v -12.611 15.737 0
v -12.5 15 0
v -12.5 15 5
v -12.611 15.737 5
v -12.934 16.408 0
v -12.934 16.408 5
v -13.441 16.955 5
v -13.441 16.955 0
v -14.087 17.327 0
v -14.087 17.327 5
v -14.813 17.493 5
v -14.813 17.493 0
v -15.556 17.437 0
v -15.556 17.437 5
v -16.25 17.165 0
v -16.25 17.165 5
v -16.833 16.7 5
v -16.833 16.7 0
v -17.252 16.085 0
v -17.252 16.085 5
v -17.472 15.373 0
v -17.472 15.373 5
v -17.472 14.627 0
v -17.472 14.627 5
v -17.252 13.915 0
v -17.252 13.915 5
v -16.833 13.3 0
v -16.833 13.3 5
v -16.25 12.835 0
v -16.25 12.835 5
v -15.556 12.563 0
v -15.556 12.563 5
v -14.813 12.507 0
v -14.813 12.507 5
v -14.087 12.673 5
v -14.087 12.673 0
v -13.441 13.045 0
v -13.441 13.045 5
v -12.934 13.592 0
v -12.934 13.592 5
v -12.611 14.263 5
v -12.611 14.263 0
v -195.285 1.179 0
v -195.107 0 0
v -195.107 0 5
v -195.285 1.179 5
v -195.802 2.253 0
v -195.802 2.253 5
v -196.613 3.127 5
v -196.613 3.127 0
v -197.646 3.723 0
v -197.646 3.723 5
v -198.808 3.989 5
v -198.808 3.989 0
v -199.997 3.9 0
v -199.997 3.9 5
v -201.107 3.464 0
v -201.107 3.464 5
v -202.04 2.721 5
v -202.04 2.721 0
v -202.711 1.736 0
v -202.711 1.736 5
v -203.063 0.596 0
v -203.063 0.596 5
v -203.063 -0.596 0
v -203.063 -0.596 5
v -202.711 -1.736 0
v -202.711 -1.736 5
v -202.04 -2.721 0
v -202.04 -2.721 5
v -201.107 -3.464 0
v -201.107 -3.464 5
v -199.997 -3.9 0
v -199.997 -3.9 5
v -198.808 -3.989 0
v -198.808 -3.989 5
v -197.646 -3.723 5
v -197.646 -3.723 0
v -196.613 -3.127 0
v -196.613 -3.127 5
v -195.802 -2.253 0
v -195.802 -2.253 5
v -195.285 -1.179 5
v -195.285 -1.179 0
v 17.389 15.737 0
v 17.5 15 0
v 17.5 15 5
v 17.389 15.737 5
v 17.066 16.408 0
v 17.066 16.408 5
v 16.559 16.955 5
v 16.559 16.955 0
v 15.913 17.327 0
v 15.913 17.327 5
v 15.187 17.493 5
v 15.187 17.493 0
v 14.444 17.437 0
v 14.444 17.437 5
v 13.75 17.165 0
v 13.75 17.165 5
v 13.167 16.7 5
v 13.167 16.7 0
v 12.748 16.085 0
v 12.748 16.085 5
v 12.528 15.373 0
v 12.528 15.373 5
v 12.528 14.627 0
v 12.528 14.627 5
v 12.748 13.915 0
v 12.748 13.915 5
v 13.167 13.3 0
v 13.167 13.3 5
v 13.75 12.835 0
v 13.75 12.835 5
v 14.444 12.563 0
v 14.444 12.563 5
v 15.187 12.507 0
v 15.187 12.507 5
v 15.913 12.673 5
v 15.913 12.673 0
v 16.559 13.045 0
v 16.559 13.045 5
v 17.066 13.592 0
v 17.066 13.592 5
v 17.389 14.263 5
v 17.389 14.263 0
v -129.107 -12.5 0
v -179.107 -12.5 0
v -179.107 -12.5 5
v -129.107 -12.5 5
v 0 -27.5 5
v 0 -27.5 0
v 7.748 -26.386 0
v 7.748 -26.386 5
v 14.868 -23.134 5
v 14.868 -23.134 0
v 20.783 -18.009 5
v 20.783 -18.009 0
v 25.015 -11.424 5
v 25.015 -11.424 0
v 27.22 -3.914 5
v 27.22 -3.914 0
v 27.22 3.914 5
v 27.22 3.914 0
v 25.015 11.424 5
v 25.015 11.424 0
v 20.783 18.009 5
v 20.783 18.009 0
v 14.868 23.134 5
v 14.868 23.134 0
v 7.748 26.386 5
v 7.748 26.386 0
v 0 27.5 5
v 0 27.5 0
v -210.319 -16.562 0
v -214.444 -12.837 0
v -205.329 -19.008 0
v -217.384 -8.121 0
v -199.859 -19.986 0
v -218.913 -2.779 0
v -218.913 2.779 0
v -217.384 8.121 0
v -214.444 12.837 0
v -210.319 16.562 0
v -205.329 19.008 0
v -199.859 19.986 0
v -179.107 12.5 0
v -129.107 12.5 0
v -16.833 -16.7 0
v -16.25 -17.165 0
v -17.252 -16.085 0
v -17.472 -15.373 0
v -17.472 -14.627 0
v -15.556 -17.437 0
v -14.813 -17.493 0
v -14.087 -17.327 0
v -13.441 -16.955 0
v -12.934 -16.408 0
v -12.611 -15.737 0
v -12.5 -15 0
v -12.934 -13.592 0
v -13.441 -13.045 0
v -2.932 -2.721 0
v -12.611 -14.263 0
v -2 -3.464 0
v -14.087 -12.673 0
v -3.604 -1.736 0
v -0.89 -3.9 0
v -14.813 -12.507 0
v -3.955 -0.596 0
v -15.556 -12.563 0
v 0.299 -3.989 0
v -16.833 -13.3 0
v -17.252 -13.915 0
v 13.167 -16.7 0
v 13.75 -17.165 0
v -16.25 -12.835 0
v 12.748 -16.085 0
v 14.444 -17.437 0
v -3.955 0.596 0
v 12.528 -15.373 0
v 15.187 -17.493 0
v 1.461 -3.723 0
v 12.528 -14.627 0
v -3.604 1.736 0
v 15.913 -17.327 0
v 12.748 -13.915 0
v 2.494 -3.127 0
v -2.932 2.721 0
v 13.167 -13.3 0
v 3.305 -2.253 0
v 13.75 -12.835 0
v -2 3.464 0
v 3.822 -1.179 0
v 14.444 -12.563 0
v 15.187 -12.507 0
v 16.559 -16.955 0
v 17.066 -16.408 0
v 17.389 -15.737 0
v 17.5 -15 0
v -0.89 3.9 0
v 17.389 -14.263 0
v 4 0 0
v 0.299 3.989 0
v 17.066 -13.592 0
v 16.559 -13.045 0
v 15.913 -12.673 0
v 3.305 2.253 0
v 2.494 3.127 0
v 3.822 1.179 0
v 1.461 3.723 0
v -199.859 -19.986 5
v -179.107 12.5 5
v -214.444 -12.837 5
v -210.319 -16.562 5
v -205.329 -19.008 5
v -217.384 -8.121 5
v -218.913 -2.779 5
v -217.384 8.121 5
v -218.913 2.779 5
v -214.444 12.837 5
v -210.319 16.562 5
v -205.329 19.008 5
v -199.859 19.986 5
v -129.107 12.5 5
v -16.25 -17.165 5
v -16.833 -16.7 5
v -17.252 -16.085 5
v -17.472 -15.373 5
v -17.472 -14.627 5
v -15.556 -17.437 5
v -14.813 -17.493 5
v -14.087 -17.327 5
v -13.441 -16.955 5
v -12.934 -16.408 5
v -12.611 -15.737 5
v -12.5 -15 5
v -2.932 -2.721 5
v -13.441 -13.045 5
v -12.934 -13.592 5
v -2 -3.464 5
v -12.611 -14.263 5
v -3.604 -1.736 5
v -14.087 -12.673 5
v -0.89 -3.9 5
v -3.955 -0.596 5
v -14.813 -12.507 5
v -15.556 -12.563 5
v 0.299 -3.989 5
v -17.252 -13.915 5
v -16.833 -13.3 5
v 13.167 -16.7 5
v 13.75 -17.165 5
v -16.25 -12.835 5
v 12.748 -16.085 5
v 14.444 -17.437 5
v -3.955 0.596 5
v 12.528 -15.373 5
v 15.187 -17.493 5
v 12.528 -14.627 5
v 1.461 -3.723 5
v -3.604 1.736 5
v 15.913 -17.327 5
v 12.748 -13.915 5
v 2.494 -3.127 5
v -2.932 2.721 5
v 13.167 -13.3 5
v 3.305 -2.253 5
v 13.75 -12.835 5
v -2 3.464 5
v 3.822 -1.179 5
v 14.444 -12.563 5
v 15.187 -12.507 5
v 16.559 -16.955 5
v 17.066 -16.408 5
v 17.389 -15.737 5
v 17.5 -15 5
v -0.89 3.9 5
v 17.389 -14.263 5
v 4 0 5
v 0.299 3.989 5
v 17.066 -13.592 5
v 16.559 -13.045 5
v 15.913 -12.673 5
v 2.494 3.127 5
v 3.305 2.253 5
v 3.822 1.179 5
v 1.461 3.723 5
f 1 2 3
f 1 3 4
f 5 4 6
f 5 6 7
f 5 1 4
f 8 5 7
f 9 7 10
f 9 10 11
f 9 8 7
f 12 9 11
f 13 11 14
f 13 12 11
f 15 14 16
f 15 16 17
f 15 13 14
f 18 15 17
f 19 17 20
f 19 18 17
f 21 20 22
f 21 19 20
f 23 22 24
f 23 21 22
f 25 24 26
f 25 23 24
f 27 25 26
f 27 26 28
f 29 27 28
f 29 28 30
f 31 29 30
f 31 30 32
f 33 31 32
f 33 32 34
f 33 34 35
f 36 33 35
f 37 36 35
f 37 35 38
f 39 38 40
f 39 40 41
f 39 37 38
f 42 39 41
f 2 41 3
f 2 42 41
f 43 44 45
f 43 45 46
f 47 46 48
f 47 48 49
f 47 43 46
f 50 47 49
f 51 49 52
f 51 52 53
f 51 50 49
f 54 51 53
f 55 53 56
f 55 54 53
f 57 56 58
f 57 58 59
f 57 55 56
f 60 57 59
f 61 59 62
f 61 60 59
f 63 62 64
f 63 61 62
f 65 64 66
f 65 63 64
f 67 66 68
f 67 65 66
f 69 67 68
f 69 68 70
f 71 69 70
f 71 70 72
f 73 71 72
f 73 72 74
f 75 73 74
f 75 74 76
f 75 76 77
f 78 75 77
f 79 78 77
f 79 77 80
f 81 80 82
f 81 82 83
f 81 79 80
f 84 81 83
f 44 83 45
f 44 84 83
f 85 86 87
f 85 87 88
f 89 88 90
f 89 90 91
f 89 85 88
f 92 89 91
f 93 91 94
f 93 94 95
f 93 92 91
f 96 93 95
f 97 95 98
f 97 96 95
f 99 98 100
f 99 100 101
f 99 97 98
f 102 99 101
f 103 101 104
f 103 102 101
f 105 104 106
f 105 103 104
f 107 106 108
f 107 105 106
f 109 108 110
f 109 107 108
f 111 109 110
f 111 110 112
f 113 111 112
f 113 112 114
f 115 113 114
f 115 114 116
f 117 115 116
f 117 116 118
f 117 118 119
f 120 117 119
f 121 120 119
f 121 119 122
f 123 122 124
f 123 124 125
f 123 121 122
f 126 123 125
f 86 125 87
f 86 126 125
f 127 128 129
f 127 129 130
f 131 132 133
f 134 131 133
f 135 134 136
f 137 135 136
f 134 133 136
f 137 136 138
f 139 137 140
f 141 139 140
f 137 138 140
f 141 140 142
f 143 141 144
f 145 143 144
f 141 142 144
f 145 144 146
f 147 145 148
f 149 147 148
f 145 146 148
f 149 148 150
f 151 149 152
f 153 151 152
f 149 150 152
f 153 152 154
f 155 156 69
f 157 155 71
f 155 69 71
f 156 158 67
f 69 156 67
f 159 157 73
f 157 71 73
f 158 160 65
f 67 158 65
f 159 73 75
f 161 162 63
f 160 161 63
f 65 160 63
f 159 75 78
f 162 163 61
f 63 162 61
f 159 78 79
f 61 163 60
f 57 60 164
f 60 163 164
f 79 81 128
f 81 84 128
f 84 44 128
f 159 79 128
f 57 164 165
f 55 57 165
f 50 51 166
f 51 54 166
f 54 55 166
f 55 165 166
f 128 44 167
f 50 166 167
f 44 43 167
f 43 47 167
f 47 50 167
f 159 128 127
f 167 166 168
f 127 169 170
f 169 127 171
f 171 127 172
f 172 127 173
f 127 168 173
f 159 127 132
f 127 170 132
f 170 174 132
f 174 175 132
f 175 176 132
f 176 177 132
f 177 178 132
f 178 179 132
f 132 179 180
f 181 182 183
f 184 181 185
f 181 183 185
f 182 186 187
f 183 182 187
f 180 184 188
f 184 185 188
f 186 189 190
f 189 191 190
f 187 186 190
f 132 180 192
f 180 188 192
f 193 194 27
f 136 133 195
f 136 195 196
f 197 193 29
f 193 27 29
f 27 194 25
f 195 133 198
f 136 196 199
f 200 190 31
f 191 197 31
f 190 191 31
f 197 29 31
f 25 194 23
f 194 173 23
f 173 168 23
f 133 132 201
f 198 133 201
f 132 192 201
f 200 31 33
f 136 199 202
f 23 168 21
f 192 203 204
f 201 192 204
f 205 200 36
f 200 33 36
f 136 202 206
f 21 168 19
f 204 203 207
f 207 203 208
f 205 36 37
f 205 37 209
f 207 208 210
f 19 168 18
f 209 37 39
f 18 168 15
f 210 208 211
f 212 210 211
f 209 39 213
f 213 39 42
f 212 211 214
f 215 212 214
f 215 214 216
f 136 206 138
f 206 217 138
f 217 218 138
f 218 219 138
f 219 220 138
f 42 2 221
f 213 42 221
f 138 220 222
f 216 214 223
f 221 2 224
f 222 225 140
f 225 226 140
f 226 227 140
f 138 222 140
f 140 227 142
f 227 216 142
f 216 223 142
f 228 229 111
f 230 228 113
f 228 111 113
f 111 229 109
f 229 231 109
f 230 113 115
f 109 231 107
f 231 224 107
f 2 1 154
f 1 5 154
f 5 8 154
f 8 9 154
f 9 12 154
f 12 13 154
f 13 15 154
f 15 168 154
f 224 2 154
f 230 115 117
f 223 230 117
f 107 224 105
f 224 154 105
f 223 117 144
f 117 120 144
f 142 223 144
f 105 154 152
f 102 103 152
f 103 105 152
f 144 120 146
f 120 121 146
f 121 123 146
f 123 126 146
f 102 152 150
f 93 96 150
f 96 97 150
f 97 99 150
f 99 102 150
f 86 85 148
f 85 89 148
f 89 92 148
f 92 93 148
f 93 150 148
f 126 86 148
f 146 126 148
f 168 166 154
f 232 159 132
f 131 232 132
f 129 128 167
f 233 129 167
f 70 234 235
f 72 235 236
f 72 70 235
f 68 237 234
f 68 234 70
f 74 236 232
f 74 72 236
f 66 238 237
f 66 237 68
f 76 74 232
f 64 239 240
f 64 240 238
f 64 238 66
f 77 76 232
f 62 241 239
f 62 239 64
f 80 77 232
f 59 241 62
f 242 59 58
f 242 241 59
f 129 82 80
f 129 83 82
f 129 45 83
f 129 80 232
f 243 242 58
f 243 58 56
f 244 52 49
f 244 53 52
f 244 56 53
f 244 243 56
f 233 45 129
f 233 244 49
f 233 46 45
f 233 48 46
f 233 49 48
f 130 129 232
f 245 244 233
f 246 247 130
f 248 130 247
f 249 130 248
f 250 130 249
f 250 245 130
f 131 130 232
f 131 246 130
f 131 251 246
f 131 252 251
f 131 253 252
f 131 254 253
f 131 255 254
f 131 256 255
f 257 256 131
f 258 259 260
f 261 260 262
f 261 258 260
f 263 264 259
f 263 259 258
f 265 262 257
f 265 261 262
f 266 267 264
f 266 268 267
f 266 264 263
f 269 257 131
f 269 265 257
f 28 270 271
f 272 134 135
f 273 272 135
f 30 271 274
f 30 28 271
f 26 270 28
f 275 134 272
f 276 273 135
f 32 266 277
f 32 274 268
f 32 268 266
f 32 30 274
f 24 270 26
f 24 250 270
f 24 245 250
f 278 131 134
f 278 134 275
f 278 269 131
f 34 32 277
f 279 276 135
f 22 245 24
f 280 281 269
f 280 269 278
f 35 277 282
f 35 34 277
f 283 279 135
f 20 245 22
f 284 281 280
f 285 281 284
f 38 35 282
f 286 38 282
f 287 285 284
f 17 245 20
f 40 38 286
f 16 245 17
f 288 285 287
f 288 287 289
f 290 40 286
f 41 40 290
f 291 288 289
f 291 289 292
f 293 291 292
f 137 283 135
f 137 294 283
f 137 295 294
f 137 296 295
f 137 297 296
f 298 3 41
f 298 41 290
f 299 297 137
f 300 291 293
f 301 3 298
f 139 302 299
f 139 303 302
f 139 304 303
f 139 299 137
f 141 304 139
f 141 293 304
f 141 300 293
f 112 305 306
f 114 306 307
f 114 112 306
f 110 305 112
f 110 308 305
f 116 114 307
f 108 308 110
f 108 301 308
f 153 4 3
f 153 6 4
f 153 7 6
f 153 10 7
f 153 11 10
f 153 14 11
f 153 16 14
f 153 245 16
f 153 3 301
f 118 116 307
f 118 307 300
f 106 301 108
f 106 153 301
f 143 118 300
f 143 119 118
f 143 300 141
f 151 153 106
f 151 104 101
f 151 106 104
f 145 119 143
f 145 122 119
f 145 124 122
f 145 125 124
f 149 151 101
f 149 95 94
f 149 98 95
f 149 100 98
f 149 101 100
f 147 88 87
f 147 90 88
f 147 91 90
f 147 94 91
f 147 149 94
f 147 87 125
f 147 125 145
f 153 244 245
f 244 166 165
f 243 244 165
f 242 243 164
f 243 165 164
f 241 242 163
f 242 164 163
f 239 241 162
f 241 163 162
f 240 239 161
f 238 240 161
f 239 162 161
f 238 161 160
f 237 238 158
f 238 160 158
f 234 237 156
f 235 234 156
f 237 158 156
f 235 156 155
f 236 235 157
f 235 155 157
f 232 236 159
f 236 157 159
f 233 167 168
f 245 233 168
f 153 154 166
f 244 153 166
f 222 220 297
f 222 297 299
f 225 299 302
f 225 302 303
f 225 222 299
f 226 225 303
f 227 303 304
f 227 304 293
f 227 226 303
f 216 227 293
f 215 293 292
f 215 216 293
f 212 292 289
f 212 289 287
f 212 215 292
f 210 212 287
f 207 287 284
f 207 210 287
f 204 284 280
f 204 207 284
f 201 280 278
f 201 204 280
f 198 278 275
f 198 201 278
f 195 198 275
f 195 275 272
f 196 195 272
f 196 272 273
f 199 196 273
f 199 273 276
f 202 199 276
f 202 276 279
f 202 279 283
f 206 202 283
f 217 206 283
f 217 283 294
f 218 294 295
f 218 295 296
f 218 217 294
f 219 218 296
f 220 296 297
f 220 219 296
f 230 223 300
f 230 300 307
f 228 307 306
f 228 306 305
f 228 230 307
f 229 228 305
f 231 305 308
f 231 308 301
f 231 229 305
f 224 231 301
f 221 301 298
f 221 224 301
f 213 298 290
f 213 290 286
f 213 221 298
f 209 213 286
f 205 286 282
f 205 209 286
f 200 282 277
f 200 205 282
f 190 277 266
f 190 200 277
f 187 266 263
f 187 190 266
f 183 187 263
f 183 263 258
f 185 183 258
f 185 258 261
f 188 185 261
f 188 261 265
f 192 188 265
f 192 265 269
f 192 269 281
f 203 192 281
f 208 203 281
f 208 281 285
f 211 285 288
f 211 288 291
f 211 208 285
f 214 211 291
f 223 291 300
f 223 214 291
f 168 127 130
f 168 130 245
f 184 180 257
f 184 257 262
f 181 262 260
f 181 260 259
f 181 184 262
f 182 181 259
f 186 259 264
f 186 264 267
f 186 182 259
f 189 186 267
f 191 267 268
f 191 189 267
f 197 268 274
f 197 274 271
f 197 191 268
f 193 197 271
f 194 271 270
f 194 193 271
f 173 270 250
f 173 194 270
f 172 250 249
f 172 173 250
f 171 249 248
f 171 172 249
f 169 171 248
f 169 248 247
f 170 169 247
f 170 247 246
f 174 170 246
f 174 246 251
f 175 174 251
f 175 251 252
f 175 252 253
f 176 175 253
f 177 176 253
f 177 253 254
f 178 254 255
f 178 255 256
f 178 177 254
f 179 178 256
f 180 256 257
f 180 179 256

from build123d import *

# Parameters (mm, degrees)
SKETCH1_R           = 2.5
SKETCH1_R_2         = 4
SKETCH1_W           = 50
SKETCH1_H           = 25
BOSS_EXTRUDE1_DEPTH = 5


with BuildPart() as part:
    # Sketch1 → Boss-Extrude1 (new body)
    with BuildSketch(Plane.XY):
        with BuildLine():
            Line((0, 27.5), (-199.858795136, 19.985879514))
            ThreePointArc((-199.858795136, 19.985879514), (-219.107383088, 0), (-199.858795136, -19.985879514))
            Line((-199.858795136, -19.985879514), (0, -27.5))
            ThreePointArc((0, -27.5), (27.5, 0), (0, 27.5))
        make_face()
        with Locations((-15, -15)):
            Circle(SKETCH1_R, mode=Mode.SUBTRACT)
        with Locations((15, 15)):
            Circle(SKETCH1_R, mode=Mode.SUBTRACT)
        with Locations((15, -15)):
            Circle(SKETCH1_R, mode=Mode.SUBTRACT)
        with Locations((-15, 15)):
            Circle(SKETCH1_R, mode=Mode.SUBTRACT)
        Circle(SKETCH1_R_2, mode=Mode.SUBTRACT)
        with Locations((-199.107383088, 0)):
            Circle(SKETCH1_R_2, mode=Mode.SUBTRACT)
        with Locations((-154.107383088, 0)):
            Rectangle(SKETCH1_W, SKETCH1_H, mode=Mode.SUBTRACT)
    extrude(amount=BOSS_EXTRUDE1_DEPTH)


solid = part.part
